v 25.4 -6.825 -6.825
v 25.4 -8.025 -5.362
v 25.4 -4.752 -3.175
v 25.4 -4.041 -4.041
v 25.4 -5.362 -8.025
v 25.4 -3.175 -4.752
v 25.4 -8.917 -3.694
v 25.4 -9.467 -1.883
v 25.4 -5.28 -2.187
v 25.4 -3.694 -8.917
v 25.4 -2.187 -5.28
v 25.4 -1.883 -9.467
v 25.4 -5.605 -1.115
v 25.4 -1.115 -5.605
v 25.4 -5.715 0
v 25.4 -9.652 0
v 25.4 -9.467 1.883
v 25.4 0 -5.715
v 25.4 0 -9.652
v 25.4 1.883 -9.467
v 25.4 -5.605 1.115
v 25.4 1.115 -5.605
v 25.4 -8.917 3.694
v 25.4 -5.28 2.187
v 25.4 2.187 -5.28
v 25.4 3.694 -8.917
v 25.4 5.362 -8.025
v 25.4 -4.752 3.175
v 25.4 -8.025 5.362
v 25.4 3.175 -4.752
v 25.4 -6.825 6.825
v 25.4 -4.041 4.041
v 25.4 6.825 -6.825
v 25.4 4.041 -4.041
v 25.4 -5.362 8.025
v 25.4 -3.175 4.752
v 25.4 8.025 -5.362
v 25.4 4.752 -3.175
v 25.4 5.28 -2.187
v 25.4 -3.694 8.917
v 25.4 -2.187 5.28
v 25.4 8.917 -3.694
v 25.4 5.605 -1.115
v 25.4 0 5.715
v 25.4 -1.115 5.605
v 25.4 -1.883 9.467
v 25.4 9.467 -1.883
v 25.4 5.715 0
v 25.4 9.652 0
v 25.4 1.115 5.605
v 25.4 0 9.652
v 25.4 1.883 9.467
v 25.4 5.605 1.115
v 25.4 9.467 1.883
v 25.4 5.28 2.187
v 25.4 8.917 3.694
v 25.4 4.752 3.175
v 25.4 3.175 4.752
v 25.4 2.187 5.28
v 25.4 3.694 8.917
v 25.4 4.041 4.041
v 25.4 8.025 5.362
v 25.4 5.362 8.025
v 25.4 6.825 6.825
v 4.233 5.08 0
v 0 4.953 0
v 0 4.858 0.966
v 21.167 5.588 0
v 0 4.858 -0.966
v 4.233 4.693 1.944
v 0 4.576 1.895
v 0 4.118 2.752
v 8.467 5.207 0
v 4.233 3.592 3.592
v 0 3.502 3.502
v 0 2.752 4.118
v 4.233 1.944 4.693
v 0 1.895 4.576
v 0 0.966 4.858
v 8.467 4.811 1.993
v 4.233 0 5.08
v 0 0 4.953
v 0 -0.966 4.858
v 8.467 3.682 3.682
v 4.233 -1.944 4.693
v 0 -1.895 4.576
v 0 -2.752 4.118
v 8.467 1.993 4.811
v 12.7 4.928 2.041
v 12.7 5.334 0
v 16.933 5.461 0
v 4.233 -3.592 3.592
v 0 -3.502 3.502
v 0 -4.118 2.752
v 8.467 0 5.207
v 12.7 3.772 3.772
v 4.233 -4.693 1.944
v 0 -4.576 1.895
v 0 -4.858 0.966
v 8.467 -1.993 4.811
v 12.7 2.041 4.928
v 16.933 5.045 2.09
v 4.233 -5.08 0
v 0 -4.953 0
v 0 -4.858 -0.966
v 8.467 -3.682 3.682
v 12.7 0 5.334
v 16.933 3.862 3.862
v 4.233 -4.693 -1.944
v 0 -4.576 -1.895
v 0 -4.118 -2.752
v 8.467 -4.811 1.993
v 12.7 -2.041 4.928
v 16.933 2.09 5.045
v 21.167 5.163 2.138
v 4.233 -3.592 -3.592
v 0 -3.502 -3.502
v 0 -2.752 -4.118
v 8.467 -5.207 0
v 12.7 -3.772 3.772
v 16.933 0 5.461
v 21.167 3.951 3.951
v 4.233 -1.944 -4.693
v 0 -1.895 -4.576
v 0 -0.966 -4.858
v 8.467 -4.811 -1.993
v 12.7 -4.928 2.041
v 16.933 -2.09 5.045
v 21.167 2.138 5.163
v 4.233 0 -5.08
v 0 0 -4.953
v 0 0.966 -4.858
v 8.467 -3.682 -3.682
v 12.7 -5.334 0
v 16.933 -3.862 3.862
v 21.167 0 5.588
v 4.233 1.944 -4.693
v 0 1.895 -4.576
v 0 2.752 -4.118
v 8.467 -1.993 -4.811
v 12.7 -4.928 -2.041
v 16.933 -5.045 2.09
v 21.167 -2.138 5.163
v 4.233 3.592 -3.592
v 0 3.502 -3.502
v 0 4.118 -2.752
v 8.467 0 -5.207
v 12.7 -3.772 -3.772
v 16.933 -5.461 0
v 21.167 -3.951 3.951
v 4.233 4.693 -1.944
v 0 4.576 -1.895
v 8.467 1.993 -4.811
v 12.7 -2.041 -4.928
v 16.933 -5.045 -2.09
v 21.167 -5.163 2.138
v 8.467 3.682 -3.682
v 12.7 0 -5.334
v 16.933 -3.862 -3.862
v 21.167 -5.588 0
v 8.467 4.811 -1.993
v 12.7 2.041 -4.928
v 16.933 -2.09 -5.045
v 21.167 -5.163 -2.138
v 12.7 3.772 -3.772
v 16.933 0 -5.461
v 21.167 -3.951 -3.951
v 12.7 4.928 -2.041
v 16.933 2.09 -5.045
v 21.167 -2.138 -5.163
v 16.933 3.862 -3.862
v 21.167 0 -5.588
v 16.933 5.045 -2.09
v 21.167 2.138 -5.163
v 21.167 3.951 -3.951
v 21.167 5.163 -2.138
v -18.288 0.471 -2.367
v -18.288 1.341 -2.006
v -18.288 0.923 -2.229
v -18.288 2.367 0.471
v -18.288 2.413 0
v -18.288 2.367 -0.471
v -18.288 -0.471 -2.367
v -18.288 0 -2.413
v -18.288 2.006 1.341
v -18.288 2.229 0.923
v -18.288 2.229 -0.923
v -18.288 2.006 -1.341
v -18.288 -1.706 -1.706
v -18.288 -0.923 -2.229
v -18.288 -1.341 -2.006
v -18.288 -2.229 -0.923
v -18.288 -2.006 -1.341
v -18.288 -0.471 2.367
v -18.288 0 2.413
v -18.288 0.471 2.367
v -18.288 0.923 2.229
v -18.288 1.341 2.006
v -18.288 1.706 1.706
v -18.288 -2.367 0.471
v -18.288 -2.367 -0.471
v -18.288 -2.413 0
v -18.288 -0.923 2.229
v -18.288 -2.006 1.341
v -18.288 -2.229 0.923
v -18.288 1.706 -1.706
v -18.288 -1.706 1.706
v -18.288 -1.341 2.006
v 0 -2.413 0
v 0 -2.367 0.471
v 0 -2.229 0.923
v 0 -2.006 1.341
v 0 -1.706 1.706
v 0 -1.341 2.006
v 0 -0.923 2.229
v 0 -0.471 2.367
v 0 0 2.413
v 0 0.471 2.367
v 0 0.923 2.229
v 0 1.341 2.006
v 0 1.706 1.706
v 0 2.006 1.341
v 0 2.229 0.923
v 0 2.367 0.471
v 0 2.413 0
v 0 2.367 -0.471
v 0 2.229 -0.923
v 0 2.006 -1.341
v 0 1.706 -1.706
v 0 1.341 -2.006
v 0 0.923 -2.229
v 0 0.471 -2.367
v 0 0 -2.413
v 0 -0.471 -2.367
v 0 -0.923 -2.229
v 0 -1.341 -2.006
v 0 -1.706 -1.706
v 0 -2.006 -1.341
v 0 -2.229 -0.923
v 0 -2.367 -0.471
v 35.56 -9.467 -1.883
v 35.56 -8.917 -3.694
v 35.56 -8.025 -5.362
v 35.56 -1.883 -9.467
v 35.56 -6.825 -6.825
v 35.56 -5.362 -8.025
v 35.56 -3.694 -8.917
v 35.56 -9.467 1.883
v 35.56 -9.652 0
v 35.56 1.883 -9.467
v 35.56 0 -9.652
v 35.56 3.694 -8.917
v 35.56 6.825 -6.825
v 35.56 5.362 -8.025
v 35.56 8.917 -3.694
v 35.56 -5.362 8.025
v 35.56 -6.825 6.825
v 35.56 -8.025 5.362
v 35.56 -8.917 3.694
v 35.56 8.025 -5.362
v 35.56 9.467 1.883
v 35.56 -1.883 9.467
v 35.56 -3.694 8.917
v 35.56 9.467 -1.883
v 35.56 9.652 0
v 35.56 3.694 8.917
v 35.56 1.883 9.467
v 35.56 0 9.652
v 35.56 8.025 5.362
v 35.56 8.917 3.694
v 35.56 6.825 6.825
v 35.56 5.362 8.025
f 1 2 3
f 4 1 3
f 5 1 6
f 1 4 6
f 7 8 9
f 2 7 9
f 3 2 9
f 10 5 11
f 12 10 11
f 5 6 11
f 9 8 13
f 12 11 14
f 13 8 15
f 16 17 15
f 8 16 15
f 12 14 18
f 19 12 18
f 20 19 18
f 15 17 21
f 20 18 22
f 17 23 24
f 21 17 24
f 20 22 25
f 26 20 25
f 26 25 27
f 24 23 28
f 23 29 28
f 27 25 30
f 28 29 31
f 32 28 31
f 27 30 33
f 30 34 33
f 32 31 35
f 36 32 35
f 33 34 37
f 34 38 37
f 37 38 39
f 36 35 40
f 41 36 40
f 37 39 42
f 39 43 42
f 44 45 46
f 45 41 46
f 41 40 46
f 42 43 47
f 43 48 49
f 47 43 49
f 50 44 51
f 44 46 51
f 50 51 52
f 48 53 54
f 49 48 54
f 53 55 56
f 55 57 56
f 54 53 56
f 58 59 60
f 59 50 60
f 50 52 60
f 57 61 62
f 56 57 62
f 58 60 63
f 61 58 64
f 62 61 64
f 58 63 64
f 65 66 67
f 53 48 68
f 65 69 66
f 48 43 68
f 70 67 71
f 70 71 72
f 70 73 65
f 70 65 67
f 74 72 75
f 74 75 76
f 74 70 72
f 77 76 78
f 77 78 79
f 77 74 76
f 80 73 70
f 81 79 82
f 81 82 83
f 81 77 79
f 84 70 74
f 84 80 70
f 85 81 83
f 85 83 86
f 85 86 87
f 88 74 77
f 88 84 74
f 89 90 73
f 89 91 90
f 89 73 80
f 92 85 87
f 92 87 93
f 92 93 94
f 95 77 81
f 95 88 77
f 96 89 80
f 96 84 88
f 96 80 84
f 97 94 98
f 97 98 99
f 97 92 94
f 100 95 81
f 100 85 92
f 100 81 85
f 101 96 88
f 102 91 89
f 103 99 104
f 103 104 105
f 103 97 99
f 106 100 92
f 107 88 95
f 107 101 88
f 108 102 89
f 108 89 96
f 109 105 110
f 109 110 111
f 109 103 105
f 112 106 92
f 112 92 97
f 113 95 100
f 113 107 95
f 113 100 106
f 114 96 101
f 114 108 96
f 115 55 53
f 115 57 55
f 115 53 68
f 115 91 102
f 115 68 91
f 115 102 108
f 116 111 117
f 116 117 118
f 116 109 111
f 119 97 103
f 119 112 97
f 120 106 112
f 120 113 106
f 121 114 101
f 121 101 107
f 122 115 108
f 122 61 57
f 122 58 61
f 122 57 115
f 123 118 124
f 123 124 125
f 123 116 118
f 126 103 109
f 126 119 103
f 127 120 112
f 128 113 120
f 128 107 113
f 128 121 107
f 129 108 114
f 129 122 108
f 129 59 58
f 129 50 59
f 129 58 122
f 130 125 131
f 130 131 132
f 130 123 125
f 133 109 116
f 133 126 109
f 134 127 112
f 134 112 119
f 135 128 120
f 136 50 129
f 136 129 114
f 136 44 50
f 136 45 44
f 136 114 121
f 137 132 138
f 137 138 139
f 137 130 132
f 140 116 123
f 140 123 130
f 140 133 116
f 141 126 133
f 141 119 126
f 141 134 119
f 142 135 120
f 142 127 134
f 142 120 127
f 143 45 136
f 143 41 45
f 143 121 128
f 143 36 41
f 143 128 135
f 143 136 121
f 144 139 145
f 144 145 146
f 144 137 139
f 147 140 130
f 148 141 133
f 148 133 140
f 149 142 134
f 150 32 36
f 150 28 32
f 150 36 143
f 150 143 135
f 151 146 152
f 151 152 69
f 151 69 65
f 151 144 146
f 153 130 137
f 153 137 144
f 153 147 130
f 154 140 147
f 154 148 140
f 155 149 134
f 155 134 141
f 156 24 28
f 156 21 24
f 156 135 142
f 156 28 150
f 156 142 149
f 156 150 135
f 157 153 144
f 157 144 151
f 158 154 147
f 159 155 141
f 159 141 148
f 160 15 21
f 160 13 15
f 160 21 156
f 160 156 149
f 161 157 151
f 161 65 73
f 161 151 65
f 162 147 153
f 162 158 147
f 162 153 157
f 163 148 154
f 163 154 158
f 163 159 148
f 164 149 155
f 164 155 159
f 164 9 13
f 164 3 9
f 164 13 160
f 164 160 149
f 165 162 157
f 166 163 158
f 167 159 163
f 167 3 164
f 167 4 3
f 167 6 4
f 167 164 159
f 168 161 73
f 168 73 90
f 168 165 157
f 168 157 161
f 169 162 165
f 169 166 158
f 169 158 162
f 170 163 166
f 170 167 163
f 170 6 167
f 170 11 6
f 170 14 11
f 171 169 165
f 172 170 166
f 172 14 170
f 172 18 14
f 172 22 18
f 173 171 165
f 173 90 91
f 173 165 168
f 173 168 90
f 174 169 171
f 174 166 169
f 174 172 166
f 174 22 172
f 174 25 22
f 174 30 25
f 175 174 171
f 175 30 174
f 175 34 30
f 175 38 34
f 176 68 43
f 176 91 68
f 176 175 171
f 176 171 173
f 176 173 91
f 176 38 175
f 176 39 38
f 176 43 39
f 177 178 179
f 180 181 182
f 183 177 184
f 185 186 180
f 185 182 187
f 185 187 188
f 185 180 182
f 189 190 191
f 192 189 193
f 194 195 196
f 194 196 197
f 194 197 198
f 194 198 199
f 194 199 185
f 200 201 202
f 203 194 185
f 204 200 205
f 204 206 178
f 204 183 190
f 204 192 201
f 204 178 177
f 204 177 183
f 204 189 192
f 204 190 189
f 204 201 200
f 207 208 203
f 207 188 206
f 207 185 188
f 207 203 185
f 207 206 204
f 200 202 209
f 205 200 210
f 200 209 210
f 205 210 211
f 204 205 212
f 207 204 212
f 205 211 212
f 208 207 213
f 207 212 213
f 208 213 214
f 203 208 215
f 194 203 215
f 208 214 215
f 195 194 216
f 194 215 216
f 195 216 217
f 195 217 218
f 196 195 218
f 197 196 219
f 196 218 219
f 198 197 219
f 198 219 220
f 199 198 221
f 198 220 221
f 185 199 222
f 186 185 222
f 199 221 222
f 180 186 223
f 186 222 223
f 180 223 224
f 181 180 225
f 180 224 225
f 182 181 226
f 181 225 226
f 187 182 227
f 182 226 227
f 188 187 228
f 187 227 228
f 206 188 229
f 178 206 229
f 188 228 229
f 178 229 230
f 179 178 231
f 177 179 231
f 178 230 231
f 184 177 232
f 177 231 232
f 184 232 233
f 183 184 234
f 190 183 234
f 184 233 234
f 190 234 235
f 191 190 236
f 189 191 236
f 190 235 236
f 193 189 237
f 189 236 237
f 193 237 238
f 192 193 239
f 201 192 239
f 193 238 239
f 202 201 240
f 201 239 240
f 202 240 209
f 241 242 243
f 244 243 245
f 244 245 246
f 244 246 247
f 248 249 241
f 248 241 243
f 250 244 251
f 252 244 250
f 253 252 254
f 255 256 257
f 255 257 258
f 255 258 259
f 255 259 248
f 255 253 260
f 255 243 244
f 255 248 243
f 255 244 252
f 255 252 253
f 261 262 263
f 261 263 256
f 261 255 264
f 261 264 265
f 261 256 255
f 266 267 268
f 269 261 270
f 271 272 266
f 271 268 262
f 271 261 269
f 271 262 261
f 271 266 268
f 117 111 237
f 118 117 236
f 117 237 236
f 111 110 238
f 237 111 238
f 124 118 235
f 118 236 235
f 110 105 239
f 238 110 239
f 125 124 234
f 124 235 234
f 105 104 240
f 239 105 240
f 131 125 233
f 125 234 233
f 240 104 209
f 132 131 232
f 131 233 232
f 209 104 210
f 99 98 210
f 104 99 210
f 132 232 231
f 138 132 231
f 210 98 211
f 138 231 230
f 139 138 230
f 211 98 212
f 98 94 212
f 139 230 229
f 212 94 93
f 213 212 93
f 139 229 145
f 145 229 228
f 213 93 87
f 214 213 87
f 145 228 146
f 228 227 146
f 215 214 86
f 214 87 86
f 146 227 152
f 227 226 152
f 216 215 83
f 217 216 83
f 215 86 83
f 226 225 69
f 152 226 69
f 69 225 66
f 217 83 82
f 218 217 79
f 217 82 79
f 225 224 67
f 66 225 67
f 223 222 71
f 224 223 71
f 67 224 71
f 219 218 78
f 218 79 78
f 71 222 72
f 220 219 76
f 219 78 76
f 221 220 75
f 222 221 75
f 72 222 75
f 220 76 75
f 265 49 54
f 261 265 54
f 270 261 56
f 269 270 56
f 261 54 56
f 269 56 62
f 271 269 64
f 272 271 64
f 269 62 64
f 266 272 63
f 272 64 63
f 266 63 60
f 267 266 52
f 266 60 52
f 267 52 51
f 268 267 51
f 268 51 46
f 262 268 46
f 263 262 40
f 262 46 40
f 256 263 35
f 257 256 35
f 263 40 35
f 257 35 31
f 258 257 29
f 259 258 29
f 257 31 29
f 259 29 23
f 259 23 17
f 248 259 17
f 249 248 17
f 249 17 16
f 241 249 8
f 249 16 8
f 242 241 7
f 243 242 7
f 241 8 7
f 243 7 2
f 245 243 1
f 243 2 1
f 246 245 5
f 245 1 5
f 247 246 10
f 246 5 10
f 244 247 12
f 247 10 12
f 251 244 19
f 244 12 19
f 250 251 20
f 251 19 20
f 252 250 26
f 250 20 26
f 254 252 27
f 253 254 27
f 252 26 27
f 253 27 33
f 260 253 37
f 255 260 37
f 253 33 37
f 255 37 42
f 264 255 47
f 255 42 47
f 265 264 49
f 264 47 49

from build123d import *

# Parameters (mm, degrees)
F0_R     = 4.953
F2_R     = 5.715
F4_R     = 2.413
F5_DEPTH = 18.288
F6_R     = 9.652
F6_R_2   = 5.715
F7_DEPTH = 10.16


with BuildPart() as f3:
    # F0 (on Right) → F3 section 0
    with BuildSketch(Plane.YZ):
        Circle(F0_R)
    # F2 (on offset) → F3 section 1
    with BuildSketch(Plane.YZ.offset(25.4)):
        Circle(F2_R)
    loft()

    # F4 (on face) → F5 (join)
    with BuildSketch(Plane(origin=(0, 0, 0), x_dir=(0, -1, 0), z_dir=(-1, 0, 0))):
        Circle(F4_R)
    extrude(amount=F5_DEPTH)

    # F6 (on face) → F7 (join)
    with BuildSketch(Plane.YZ.offset(25.4)):
        Circle(F6_R)
        Circle(F6_R_2, mode=Mode.SUBTRACT)
        Circle(F6_R_2)
    extrude(amount=F7_DEPTH)


solid = f3.part
